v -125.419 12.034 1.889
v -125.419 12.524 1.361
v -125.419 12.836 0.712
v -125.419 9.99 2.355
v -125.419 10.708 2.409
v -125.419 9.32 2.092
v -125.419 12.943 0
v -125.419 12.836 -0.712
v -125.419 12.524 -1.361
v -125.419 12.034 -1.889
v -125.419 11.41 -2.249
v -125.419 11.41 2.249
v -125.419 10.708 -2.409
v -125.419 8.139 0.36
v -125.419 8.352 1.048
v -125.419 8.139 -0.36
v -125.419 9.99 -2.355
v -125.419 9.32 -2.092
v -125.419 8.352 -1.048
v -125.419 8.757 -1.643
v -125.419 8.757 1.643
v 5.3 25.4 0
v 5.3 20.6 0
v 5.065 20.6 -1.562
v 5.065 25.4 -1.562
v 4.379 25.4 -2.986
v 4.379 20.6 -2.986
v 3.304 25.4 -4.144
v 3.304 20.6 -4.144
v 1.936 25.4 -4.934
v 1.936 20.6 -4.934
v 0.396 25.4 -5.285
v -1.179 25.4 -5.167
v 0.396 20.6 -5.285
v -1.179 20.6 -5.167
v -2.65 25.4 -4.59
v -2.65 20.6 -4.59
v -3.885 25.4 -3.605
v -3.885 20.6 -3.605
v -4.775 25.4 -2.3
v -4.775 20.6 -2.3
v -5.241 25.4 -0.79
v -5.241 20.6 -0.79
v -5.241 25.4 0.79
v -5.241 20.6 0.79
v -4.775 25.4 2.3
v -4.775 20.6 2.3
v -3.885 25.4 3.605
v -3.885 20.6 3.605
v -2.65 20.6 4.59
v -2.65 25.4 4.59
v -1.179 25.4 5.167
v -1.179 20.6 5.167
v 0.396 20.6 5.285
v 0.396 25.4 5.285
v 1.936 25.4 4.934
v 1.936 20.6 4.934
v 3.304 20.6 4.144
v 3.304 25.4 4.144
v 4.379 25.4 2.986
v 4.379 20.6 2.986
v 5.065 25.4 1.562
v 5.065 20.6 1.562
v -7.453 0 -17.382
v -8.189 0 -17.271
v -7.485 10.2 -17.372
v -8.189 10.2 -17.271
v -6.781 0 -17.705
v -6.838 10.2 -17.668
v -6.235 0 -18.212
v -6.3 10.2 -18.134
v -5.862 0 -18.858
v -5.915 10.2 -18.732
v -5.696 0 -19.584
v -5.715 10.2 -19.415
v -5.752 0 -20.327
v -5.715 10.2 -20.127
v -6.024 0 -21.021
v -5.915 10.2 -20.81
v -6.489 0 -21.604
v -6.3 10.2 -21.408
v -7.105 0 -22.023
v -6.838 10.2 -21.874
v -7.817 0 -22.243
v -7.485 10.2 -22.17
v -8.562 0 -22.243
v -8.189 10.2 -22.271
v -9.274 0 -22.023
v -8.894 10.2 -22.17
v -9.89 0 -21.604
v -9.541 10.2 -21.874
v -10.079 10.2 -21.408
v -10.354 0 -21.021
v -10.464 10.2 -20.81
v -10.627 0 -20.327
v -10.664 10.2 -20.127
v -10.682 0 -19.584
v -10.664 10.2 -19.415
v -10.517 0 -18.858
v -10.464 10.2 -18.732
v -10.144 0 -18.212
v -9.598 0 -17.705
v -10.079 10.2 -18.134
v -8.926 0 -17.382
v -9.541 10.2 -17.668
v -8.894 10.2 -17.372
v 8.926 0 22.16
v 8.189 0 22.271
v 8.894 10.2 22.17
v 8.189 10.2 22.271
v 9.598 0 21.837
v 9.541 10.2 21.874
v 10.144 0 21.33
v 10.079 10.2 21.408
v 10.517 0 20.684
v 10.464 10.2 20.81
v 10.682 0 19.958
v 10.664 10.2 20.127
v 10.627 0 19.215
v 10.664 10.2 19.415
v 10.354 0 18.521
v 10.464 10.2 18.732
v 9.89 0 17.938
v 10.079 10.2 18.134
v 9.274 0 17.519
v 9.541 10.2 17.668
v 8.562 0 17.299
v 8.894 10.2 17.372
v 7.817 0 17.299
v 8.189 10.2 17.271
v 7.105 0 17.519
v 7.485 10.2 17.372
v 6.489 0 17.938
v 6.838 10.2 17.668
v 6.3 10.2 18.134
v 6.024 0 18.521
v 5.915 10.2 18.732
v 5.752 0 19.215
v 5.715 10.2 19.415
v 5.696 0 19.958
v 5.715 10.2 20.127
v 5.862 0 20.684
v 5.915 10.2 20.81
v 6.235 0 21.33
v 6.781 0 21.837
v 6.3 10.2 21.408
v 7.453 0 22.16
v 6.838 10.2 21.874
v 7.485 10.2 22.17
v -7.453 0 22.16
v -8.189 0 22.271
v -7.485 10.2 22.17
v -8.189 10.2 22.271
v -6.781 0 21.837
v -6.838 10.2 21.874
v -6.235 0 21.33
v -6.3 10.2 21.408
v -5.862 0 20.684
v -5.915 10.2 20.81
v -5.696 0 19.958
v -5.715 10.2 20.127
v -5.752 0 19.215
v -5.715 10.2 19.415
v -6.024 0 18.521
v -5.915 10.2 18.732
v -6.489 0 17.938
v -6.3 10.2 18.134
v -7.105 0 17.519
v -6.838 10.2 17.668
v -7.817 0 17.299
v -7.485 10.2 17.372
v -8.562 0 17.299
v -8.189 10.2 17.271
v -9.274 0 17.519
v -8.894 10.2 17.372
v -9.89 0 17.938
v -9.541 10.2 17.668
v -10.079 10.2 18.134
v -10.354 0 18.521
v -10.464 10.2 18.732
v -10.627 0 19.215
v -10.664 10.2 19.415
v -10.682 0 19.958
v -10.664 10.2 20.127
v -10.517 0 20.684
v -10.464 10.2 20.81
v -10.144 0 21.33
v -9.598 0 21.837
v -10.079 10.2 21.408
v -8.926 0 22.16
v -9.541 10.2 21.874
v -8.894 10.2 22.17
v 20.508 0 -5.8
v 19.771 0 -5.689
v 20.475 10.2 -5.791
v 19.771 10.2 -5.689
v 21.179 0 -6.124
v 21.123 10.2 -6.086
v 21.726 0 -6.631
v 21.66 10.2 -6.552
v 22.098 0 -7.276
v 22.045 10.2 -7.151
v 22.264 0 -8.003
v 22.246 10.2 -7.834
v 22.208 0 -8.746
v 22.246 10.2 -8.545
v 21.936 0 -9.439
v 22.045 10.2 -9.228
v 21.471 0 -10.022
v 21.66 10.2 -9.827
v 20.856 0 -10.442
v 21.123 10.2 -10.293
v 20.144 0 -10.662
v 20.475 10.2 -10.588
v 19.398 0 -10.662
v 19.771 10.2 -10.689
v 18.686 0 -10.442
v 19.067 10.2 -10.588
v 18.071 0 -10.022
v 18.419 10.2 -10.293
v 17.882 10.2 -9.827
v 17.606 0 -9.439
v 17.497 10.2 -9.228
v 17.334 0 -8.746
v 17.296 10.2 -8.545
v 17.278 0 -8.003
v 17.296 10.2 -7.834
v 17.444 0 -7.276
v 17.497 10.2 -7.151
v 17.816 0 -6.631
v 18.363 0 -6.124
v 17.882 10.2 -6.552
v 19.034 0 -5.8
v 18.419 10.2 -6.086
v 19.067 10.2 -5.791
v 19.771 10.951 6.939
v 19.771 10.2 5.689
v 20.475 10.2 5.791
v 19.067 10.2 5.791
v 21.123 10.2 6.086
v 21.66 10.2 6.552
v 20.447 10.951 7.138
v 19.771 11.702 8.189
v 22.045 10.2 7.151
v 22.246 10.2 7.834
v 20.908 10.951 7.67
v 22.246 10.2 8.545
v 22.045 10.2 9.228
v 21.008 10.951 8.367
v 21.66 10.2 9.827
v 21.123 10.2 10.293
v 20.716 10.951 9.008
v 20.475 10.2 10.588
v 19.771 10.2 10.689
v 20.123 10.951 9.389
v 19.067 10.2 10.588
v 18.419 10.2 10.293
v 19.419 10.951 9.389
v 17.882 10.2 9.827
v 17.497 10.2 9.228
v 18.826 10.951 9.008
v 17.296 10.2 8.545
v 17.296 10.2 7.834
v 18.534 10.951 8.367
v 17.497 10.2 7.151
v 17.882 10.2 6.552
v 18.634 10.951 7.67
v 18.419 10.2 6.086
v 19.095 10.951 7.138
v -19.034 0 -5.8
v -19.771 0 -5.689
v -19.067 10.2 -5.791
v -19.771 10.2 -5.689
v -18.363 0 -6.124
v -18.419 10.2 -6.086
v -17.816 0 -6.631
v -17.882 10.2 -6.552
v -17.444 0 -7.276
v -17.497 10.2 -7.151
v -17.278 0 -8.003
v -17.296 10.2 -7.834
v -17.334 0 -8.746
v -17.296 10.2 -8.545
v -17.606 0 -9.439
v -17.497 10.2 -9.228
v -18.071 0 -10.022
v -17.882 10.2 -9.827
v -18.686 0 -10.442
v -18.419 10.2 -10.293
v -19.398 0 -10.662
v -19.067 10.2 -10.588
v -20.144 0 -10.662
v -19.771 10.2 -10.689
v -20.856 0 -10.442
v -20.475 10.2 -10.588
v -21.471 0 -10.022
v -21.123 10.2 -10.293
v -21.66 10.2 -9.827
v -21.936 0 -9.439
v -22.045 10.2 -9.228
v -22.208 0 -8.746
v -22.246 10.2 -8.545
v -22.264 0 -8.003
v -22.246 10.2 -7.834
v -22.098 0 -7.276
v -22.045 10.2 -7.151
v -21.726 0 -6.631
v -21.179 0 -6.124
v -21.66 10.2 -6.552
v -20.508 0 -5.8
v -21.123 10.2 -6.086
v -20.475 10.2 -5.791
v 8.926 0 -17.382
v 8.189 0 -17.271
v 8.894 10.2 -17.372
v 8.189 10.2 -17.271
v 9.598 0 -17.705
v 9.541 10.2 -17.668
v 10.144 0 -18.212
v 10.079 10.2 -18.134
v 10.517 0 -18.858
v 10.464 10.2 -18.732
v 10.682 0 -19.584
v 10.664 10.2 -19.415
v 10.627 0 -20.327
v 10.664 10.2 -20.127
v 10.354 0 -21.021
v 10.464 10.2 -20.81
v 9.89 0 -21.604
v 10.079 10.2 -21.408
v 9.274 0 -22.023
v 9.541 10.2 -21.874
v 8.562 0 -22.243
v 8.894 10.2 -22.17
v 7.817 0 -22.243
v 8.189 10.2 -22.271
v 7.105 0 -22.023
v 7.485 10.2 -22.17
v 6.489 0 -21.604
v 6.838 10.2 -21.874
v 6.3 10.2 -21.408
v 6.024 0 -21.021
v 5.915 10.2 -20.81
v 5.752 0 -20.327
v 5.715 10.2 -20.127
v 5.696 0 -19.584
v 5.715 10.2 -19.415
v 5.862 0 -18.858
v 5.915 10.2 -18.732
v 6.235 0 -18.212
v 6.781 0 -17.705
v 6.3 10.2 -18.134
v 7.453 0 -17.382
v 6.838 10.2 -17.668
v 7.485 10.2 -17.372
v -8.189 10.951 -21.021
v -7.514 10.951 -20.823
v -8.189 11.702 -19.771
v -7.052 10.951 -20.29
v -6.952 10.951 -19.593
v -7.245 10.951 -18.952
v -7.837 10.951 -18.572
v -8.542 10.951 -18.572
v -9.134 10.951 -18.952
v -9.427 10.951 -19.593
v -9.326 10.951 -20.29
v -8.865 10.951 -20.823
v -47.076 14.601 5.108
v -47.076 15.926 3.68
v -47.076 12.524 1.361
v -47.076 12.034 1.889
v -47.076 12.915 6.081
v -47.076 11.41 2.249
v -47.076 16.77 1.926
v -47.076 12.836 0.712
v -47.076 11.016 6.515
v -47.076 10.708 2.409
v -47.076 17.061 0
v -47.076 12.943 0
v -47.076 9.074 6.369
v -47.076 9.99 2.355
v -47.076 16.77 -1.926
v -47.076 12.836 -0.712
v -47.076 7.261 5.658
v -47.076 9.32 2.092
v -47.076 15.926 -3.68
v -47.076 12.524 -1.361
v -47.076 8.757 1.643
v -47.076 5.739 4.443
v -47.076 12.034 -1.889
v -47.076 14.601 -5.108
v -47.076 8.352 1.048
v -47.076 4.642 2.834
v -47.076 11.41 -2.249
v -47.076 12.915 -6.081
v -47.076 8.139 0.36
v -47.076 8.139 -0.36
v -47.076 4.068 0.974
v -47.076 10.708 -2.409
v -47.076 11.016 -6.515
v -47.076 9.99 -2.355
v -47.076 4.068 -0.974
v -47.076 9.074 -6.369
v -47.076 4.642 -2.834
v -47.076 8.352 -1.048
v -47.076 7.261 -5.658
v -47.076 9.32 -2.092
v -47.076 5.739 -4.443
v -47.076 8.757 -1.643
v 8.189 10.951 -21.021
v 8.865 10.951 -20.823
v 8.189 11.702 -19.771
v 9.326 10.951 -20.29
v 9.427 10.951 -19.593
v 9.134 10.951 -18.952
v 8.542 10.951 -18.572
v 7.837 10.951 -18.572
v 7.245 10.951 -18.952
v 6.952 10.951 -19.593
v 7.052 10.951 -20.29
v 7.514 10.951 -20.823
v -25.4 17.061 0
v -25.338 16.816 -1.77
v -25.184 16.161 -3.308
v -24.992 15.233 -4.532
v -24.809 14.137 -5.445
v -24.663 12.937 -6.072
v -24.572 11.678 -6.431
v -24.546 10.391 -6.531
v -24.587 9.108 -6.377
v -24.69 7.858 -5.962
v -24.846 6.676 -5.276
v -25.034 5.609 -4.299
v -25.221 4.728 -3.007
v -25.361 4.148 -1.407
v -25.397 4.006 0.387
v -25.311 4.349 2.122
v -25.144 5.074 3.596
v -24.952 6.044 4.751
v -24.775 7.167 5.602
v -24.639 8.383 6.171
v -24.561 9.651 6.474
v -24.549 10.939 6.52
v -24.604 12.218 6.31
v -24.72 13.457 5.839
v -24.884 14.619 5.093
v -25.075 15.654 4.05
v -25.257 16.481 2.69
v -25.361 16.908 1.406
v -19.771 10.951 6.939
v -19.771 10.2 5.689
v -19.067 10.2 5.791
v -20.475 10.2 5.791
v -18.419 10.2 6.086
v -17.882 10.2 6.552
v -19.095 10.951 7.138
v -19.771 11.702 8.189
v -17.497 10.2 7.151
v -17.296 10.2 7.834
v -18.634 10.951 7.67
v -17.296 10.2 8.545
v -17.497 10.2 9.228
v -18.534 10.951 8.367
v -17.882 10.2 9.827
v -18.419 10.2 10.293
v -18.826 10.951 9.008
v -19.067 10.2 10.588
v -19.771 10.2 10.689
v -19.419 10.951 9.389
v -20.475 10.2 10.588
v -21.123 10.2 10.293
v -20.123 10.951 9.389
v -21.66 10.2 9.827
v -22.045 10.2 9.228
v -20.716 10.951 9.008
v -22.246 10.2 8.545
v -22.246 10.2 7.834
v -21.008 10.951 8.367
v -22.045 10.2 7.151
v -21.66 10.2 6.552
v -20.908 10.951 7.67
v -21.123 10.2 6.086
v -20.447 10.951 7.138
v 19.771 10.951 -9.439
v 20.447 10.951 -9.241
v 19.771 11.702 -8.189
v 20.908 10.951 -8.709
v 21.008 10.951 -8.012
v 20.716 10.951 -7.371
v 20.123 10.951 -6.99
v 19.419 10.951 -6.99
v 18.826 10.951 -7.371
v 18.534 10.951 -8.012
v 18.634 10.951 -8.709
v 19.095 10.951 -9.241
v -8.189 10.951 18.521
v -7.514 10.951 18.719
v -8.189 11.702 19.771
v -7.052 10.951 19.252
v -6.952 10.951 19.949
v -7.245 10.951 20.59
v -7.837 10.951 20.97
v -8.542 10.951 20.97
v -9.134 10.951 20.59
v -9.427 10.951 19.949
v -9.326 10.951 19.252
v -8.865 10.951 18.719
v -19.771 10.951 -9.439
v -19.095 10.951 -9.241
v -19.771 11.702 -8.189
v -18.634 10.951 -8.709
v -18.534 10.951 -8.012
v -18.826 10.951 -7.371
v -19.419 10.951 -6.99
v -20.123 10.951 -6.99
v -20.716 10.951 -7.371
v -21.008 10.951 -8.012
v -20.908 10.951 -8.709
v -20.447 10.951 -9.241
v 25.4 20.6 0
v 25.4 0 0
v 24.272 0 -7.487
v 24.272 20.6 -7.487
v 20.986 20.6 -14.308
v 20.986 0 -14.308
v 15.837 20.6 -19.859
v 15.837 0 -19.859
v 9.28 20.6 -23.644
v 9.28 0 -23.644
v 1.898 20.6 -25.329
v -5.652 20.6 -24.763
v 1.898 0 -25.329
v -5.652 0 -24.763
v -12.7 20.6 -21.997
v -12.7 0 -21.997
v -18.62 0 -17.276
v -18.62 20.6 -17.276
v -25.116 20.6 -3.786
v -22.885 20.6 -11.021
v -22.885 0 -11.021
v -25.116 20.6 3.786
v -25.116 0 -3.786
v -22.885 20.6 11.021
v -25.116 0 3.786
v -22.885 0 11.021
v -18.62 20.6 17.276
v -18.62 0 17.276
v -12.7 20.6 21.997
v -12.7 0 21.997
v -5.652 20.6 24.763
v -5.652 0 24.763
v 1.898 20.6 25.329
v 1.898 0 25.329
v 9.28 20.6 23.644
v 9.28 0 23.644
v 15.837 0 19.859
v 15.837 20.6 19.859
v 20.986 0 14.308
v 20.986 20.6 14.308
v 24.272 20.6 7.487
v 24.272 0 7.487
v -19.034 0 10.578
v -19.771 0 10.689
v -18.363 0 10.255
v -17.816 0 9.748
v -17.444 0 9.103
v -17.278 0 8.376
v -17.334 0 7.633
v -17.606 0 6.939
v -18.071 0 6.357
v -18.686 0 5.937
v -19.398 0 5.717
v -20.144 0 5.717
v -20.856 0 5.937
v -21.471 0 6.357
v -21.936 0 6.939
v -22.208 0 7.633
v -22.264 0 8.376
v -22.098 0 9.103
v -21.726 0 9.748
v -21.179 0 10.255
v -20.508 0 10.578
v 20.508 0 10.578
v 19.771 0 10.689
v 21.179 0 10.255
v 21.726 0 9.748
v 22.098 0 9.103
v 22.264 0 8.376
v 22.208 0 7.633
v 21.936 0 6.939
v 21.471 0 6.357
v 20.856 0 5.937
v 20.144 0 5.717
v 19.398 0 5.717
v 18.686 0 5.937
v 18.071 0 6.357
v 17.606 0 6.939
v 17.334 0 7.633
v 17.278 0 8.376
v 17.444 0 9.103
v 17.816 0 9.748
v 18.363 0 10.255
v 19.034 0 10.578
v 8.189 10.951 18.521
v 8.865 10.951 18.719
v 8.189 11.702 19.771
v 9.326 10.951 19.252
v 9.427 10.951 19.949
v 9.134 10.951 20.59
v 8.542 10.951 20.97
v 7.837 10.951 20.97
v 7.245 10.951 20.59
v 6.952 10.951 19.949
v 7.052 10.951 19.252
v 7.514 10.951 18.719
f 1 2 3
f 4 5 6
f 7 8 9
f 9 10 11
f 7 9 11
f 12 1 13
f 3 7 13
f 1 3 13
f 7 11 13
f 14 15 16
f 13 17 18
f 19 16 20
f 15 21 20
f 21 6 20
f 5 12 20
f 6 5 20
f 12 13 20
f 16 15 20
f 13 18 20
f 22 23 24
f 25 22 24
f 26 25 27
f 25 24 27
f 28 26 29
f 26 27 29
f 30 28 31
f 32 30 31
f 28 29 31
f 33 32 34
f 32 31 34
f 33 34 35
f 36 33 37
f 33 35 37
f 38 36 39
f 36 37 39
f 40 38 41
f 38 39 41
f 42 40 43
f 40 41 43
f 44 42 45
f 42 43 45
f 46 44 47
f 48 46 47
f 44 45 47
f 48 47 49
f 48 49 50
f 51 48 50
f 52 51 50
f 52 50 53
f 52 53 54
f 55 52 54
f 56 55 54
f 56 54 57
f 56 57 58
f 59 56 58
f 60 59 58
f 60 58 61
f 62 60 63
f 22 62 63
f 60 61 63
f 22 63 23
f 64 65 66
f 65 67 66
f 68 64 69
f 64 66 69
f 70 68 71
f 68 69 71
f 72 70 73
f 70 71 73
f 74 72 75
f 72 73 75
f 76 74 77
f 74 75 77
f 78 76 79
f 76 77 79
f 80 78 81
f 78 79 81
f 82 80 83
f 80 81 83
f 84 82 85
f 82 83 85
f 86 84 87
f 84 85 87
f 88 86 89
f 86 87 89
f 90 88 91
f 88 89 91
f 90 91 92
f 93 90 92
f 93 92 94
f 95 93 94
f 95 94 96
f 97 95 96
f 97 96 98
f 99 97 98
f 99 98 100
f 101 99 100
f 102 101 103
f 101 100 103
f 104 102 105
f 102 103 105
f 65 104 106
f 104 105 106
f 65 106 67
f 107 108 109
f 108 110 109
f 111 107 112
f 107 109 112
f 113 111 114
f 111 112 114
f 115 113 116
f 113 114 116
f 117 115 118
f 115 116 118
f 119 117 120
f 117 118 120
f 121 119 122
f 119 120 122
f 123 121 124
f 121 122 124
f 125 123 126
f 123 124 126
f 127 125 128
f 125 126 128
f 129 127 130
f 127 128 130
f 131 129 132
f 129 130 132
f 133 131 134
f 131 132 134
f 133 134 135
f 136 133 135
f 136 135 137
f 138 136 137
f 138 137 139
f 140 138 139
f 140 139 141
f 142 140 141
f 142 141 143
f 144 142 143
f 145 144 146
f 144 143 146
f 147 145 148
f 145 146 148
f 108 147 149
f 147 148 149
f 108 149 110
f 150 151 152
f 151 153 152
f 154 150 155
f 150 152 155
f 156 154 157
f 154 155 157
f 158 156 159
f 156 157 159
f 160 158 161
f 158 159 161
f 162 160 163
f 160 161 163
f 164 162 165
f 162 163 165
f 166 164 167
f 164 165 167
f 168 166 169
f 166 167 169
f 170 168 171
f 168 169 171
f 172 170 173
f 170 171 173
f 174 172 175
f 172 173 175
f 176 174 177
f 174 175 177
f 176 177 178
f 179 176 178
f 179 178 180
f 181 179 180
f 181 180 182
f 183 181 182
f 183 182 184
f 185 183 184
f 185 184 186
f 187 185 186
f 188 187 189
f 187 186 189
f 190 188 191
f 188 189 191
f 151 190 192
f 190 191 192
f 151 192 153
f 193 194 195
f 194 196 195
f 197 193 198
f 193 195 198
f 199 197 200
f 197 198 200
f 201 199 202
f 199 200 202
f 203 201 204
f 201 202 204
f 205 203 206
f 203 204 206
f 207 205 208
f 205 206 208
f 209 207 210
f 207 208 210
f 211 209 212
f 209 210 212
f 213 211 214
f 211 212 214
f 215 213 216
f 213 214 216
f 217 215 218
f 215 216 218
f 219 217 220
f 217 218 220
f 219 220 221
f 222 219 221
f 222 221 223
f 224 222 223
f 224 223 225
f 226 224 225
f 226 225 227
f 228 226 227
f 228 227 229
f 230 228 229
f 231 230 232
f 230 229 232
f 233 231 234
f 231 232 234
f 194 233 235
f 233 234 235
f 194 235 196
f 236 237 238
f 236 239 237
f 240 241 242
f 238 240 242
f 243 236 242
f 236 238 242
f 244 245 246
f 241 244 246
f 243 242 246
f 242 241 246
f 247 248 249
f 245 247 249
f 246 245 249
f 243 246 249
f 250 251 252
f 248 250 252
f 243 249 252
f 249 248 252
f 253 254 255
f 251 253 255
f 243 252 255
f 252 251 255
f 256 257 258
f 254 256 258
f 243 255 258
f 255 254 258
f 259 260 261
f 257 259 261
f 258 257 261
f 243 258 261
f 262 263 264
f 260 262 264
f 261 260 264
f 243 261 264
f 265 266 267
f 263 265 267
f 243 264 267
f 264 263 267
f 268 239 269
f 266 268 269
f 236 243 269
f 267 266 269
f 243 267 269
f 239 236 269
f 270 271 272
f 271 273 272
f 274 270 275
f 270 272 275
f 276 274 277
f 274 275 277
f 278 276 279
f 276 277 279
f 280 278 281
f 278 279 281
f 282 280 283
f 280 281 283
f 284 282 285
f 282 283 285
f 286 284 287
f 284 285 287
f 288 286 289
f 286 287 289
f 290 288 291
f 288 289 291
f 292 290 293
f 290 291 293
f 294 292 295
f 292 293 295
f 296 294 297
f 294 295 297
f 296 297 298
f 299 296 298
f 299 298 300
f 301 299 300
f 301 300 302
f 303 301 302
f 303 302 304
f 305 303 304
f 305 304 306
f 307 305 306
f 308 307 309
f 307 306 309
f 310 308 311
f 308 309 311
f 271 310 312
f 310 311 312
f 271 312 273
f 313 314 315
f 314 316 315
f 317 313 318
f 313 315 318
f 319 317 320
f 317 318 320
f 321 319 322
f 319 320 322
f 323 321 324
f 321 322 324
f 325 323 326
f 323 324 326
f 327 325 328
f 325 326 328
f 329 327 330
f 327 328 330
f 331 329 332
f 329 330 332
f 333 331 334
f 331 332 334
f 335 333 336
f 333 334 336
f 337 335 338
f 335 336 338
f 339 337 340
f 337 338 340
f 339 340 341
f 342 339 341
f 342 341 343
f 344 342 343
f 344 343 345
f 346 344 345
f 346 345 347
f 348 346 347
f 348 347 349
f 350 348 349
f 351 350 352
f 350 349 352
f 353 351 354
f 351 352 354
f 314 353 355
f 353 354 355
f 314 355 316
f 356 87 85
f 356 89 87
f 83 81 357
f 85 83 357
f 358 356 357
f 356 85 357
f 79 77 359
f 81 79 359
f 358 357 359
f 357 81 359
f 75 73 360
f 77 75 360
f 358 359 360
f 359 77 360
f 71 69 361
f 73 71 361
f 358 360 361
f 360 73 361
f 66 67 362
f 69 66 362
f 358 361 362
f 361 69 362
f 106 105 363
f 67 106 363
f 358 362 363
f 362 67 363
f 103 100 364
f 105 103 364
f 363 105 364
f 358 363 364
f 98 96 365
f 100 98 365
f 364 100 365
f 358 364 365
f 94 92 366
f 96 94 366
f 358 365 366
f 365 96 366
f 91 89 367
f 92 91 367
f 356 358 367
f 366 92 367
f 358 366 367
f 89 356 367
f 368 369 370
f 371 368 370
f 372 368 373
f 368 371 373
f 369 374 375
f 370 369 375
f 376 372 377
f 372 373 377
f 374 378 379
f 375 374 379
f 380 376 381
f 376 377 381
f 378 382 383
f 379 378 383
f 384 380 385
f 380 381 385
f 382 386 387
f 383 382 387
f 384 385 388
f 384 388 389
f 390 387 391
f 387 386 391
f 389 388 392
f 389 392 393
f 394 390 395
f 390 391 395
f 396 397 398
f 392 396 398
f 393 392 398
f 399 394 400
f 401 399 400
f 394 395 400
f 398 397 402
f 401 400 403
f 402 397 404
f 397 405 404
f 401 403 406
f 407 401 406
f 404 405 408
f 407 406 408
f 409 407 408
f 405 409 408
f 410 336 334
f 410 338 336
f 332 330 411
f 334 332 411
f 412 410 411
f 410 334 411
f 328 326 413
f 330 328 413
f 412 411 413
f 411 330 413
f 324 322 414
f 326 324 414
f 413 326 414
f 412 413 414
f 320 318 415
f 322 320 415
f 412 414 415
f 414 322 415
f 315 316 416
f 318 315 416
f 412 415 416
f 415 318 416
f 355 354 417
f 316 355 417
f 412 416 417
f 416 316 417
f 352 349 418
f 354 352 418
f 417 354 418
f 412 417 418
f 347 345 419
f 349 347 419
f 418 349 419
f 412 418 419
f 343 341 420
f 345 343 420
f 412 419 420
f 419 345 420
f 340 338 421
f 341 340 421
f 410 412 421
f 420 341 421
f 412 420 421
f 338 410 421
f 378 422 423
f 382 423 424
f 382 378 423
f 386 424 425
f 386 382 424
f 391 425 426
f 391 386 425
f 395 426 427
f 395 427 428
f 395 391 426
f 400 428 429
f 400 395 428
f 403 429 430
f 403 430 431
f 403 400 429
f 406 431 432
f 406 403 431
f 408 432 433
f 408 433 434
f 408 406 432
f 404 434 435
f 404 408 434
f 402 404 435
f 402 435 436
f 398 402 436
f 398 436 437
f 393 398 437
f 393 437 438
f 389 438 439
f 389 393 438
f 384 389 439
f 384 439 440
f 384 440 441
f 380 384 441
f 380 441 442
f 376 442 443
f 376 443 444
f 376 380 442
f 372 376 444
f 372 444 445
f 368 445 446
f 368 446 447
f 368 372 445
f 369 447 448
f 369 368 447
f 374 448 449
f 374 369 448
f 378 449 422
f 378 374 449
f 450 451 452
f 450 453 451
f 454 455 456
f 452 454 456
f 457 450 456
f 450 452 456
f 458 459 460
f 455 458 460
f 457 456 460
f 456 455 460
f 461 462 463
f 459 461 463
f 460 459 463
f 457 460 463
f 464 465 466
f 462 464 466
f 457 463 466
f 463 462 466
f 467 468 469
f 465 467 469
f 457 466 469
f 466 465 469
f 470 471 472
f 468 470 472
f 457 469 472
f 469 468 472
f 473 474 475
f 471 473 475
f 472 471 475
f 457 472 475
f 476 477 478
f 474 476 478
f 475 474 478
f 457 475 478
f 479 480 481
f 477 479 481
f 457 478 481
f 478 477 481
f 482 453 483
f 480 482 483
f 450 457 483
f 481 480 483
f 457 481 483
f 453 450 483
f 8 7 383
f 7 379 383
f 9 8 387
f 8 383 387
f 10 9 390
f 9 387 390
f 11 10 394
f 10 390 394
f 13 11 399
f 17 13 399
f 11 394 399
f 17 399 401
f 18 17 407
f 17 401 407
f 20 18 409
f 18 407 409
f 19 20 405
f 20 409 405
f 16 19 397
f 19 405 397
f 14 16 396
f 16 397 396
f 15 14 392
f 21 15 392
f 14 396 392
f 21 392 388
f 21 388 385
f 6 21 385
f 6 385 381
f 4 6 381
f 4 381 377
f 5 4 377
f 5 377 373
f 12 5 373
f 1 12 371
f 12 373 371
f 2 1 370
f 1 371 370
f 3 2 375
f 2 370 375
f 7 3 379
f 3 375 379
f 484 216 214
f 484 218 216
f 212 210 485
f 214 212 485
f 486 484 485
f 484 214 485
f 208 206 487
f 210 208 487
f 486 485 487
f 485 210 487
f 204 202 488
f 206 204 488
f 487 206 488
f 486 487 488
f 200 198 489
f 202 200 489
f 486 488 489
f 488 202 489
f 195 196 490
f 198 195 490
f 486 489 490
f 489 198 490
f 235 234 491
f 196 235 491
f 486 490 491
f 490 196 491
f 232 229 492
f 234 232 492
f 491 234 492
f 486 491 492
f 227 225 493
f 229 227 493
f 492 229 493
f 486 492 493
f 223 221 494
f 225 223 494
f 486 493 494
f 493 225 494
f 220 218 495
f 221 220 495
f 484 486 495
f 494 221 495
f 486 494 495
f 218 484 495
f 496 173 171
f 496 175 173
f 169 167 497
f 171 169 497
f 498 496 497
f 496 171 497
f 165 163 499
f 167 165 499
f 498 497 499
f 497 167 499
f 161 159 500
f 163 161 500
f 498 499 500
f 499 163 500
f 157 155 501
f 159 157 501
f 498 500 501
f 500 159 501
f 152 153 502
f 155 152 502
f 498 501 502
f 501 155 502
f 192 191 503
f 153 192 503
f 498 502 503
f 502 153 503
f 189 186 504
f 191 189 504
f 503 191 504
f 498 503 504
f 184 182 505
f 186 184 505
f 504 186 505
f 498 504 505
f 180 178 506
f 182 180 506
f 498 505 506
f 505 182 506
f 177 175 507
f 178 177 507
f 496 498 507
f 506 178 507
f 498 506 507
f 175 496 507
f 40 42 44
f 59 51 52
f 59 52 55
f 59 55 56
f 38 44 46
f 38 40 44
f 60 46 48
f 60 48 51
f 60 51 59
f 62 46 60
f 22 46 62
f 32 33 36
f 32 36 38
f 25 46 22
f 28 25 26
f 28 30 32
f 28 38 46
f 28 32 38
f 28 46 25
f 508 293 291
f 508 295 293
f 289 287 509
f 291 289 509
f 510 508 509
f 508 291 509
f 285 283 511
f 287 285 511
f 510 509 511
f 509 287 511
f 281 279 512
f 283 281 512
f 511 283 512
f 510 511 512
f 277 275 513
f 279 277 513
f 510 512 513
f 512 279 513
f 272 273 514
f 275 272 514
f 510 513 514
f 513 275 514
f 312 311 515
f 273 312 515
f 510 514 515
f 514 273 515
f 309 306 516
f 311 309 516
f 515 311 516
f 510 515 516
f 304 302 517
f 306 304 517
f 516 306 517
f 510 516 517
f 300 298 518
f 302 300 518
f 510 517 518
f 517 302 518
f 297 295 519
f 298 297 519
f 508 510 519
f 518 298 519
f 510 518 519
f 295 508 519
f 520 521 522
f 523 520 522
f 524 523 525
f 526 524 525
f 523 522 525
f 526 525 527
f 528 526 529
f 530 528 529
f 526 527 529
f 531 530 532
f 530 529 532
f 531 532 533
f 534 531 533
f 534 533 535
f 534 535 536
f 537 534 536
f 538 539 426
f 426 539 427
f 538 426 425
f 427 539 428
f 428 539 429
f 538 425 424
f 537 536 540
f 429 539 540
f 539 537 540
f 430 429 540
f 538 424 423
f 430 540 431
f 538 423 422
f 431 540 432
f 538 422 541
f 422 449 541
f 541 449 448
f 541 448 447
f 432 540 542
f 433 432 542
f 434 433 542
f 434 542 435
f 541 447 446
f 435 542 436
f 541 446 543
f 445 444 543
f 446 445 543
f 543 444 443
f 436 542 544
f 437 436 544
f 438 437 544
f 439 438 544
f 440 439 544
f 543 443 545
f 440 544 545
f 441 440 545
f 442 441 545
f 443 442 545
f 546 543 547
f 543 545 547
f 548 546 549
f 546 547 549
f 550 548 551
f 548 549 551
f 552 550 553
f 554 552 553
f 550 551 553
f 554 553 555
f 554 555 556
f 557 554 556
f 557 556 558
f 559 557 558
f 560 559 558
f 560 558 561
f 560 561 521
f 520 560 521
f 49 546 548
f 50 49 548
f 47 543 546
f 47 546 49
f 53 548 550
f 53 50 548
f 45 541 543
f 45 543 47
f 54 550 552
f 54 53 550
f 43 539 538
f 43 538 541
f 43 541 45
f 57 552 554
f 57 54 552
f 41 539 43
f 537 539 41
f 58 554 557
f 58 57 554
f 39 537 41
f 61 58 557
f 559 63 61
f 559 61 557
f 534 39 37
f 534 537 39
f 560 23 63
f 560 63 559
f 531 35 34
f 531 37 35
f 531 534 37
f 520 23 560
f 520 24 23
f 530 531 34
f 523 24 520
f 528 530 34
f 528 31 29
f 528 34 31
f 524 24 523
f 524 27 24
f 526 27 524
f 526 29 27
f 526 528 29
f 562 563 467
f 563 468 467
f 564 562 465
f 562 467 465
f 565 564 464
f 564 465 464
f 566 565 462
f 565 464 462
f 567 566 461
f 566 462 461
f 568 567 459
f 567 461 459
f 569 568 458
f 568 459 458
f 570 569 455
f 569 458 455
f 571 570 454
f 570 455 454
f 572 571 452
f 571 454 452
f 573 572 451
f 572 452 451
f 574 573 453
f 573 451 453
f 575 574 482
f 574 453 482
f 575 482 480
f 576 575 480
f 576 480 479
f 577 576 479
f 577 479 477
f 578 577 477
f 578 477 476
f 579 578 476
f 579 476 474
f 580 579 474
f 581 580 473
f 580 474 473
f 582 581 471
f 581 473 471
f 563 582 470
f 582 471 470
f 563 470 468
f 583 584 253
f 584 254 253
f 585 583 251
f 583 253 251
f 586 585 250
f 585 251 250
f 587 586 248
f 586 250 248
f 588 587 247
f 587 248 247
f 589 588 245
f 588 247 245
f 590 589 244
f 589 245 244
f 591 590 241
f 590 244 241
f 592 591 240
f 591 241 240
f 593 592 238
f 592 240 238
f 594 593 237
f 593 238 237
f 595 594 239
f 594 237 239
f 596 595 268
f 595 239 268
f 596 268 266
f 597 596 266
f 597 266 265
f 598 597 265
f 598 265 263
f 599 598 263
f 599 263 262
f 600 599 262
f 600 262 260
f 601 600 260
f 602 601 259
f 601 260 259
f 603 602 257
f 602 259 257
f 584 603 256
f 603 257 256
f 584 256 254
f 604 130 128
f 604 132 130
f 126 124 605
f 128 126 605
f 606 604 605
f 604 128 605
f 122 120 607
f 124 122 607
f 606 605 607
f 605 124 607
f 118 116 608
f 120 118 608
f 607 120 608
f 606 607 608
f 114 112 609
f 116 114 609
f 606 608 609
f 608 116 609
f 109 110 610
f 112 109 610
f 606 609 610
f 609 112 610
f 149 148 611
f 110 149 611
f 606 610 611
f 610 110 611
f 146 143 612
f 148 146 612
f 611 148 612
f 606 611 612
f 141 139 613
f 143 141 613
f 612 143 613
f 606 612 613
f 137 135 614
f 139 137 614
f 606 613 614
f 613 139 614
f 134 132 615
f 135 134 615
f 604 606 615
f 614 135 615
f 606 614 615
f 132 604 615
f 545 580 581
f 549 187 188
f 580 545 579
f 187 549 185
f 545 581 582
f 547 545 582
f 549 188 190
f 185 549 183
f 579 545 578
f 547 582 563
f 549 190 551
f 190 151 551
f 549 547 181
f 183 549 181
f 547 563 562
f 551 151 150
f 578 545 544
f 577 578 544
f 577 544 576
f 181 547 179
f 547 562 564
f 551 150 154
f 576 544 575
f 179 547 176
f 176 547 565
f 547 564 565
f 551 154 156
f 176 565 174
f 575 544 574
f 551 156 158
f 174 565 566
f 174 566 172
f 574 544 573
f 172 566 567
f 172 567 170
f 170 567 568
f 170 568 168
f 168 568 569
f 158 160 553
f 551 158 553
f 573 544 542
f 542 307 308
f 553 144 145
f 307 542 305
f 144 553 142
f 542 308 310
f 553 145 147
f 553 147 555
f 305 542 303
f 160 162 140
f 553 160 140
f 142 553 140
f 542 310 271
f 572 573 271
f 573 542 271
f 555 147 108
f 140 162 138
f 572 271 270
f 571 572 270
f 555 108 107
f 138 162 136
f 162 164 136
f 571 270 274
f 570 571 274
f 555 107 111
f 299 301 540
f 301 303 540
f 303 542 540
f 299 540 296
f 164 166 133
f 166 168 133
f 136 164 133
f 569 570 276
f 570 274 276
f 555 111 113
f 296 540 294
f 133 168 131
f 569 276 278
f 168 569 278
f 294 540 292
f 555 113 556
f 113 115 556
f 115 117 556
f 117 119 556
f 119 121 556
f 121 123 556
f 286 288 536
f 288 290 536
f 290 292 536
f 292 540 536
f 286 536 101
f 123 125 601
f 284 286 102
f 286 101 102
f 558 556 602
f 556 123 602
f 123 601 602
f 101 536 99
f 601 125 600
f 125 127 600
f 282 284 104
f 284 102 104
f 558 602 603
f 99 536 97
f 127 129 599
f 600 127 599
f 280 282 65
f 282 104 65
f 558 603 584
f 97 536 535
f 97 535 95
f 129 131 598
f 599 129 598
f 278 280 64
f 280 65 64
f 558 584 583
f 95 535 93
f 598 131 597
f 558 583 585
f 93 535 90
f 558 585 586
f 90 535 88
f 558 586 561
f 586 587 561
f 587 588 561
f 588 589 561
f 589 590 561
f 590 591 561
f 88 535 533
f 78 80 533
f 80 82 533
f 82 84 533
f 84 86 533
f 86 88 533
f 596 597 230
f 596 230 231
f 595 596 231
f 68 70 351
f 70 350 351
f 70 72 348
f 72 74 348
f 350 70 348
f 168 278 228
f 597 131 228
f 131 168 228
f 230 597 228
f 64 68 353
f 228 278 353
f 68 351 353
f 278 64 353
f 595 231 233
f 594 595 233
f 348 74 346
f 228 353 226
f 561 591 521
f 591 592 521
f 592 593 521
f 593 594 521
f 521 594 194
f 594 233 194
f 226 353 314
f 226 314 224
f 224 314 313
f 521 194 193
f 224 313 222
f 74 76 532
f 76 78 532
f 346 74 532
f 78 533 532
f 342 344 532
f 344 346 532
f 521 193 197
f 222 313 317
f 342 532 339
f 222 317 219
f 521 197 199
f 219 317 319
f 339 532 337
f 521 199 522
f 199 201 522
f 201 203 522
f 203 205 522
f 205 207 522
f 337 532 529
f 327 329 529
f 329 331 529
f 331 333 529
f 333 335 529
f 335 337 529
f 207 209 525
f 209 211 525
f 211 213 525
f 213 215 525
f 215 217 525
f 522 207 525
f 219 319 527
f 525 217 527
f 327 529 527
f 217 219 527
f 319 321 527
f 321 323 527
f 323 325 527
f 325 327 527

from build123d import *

# Parameters (mm, degrees)
SKETCH1_R                 = 25.4
BASE_DEPTH                = 20.6
SKETCH2_R                 = 5.3
BUTTON_DEPTH              = 4.8
F_5_0MM_DOWEL_HOLE1_D     = 5
F_5_0MM_DOWEL_HOLE1_DEPTH = 10.2
F_5_0MM_DOWEL_HOLE1_TIP   = 1.502151548


with BuildPart() as part:
    # Sketch1 → base (new body)
    with BuildSketch(Plane(origin=(0, 0, 0), x_dir=(1, 0, 0), z_dir=(0, 1, 0))):
        Circle(SKETCH1_R)
    extrude(amount=BASE_DEPTH)

    # Sketch2 → button (add)
    with BuildSketch(Plane(origin=(0, 20.6, 0), x_dir=(1, 0, 0), z_dir=(0, 1, 0))):
        Circle(SKETCH2_R)
    extrude(amount=BUTTON_DEPTH)

    # Sketch3 → cable (revolve)
    with BuildSketch(Plane.XY):
        Polygon((-25.075504061, 10.527856927), (-125.419033552, 10.527856927), (-125.419033552, 12.943392514), (-47.075504061, 12.943392514), (-47.075504061, 17.060710463), (-25.075504061, 17.060710463), (-19.522492217, 17.060710463), (-19.522492217, 10.527856927), align=None)
    revolve(axis=Axis((-25.075504061, 10.527856927, 0), (-1, 0, 0)))

    # Ø5.0mm Dowel Hole1
    with Locations(Plane(origin=(-19.771021996, 0, 8.189425453), x_dir=(0, 0, -1), z_dir=(0, -1, 0))):
        with Locations((0, 0), (-11.581596543, 11.581596543), (-11.581596543, 27.960447449), (0, 39.542043992), (16.378850906, 39.542043992), (27.960447449, 27.960447449), (27.960447449, 11.581596543), (16.378850906, 0)):
            Hole(F_5_0MM_DOWEL_HOLE1_D / 2, depth=F_5_0MM_DOWEL_HOLE1_DEPTH)
            with Locations((0, 0, -(F_5_0MM_DOWEL_HOLE1_DEPTH + F_5_0MM_DOWEL_HOLE1_TIP / 2))):  # 118° drill point
                Cone(0, F_5_0MM_DOWEL_HOLE1_D / 2, F_5_0MM_DOWEL_HOLE1_TIP, mode=Mode.SUBTRACT)


solid = part.part
